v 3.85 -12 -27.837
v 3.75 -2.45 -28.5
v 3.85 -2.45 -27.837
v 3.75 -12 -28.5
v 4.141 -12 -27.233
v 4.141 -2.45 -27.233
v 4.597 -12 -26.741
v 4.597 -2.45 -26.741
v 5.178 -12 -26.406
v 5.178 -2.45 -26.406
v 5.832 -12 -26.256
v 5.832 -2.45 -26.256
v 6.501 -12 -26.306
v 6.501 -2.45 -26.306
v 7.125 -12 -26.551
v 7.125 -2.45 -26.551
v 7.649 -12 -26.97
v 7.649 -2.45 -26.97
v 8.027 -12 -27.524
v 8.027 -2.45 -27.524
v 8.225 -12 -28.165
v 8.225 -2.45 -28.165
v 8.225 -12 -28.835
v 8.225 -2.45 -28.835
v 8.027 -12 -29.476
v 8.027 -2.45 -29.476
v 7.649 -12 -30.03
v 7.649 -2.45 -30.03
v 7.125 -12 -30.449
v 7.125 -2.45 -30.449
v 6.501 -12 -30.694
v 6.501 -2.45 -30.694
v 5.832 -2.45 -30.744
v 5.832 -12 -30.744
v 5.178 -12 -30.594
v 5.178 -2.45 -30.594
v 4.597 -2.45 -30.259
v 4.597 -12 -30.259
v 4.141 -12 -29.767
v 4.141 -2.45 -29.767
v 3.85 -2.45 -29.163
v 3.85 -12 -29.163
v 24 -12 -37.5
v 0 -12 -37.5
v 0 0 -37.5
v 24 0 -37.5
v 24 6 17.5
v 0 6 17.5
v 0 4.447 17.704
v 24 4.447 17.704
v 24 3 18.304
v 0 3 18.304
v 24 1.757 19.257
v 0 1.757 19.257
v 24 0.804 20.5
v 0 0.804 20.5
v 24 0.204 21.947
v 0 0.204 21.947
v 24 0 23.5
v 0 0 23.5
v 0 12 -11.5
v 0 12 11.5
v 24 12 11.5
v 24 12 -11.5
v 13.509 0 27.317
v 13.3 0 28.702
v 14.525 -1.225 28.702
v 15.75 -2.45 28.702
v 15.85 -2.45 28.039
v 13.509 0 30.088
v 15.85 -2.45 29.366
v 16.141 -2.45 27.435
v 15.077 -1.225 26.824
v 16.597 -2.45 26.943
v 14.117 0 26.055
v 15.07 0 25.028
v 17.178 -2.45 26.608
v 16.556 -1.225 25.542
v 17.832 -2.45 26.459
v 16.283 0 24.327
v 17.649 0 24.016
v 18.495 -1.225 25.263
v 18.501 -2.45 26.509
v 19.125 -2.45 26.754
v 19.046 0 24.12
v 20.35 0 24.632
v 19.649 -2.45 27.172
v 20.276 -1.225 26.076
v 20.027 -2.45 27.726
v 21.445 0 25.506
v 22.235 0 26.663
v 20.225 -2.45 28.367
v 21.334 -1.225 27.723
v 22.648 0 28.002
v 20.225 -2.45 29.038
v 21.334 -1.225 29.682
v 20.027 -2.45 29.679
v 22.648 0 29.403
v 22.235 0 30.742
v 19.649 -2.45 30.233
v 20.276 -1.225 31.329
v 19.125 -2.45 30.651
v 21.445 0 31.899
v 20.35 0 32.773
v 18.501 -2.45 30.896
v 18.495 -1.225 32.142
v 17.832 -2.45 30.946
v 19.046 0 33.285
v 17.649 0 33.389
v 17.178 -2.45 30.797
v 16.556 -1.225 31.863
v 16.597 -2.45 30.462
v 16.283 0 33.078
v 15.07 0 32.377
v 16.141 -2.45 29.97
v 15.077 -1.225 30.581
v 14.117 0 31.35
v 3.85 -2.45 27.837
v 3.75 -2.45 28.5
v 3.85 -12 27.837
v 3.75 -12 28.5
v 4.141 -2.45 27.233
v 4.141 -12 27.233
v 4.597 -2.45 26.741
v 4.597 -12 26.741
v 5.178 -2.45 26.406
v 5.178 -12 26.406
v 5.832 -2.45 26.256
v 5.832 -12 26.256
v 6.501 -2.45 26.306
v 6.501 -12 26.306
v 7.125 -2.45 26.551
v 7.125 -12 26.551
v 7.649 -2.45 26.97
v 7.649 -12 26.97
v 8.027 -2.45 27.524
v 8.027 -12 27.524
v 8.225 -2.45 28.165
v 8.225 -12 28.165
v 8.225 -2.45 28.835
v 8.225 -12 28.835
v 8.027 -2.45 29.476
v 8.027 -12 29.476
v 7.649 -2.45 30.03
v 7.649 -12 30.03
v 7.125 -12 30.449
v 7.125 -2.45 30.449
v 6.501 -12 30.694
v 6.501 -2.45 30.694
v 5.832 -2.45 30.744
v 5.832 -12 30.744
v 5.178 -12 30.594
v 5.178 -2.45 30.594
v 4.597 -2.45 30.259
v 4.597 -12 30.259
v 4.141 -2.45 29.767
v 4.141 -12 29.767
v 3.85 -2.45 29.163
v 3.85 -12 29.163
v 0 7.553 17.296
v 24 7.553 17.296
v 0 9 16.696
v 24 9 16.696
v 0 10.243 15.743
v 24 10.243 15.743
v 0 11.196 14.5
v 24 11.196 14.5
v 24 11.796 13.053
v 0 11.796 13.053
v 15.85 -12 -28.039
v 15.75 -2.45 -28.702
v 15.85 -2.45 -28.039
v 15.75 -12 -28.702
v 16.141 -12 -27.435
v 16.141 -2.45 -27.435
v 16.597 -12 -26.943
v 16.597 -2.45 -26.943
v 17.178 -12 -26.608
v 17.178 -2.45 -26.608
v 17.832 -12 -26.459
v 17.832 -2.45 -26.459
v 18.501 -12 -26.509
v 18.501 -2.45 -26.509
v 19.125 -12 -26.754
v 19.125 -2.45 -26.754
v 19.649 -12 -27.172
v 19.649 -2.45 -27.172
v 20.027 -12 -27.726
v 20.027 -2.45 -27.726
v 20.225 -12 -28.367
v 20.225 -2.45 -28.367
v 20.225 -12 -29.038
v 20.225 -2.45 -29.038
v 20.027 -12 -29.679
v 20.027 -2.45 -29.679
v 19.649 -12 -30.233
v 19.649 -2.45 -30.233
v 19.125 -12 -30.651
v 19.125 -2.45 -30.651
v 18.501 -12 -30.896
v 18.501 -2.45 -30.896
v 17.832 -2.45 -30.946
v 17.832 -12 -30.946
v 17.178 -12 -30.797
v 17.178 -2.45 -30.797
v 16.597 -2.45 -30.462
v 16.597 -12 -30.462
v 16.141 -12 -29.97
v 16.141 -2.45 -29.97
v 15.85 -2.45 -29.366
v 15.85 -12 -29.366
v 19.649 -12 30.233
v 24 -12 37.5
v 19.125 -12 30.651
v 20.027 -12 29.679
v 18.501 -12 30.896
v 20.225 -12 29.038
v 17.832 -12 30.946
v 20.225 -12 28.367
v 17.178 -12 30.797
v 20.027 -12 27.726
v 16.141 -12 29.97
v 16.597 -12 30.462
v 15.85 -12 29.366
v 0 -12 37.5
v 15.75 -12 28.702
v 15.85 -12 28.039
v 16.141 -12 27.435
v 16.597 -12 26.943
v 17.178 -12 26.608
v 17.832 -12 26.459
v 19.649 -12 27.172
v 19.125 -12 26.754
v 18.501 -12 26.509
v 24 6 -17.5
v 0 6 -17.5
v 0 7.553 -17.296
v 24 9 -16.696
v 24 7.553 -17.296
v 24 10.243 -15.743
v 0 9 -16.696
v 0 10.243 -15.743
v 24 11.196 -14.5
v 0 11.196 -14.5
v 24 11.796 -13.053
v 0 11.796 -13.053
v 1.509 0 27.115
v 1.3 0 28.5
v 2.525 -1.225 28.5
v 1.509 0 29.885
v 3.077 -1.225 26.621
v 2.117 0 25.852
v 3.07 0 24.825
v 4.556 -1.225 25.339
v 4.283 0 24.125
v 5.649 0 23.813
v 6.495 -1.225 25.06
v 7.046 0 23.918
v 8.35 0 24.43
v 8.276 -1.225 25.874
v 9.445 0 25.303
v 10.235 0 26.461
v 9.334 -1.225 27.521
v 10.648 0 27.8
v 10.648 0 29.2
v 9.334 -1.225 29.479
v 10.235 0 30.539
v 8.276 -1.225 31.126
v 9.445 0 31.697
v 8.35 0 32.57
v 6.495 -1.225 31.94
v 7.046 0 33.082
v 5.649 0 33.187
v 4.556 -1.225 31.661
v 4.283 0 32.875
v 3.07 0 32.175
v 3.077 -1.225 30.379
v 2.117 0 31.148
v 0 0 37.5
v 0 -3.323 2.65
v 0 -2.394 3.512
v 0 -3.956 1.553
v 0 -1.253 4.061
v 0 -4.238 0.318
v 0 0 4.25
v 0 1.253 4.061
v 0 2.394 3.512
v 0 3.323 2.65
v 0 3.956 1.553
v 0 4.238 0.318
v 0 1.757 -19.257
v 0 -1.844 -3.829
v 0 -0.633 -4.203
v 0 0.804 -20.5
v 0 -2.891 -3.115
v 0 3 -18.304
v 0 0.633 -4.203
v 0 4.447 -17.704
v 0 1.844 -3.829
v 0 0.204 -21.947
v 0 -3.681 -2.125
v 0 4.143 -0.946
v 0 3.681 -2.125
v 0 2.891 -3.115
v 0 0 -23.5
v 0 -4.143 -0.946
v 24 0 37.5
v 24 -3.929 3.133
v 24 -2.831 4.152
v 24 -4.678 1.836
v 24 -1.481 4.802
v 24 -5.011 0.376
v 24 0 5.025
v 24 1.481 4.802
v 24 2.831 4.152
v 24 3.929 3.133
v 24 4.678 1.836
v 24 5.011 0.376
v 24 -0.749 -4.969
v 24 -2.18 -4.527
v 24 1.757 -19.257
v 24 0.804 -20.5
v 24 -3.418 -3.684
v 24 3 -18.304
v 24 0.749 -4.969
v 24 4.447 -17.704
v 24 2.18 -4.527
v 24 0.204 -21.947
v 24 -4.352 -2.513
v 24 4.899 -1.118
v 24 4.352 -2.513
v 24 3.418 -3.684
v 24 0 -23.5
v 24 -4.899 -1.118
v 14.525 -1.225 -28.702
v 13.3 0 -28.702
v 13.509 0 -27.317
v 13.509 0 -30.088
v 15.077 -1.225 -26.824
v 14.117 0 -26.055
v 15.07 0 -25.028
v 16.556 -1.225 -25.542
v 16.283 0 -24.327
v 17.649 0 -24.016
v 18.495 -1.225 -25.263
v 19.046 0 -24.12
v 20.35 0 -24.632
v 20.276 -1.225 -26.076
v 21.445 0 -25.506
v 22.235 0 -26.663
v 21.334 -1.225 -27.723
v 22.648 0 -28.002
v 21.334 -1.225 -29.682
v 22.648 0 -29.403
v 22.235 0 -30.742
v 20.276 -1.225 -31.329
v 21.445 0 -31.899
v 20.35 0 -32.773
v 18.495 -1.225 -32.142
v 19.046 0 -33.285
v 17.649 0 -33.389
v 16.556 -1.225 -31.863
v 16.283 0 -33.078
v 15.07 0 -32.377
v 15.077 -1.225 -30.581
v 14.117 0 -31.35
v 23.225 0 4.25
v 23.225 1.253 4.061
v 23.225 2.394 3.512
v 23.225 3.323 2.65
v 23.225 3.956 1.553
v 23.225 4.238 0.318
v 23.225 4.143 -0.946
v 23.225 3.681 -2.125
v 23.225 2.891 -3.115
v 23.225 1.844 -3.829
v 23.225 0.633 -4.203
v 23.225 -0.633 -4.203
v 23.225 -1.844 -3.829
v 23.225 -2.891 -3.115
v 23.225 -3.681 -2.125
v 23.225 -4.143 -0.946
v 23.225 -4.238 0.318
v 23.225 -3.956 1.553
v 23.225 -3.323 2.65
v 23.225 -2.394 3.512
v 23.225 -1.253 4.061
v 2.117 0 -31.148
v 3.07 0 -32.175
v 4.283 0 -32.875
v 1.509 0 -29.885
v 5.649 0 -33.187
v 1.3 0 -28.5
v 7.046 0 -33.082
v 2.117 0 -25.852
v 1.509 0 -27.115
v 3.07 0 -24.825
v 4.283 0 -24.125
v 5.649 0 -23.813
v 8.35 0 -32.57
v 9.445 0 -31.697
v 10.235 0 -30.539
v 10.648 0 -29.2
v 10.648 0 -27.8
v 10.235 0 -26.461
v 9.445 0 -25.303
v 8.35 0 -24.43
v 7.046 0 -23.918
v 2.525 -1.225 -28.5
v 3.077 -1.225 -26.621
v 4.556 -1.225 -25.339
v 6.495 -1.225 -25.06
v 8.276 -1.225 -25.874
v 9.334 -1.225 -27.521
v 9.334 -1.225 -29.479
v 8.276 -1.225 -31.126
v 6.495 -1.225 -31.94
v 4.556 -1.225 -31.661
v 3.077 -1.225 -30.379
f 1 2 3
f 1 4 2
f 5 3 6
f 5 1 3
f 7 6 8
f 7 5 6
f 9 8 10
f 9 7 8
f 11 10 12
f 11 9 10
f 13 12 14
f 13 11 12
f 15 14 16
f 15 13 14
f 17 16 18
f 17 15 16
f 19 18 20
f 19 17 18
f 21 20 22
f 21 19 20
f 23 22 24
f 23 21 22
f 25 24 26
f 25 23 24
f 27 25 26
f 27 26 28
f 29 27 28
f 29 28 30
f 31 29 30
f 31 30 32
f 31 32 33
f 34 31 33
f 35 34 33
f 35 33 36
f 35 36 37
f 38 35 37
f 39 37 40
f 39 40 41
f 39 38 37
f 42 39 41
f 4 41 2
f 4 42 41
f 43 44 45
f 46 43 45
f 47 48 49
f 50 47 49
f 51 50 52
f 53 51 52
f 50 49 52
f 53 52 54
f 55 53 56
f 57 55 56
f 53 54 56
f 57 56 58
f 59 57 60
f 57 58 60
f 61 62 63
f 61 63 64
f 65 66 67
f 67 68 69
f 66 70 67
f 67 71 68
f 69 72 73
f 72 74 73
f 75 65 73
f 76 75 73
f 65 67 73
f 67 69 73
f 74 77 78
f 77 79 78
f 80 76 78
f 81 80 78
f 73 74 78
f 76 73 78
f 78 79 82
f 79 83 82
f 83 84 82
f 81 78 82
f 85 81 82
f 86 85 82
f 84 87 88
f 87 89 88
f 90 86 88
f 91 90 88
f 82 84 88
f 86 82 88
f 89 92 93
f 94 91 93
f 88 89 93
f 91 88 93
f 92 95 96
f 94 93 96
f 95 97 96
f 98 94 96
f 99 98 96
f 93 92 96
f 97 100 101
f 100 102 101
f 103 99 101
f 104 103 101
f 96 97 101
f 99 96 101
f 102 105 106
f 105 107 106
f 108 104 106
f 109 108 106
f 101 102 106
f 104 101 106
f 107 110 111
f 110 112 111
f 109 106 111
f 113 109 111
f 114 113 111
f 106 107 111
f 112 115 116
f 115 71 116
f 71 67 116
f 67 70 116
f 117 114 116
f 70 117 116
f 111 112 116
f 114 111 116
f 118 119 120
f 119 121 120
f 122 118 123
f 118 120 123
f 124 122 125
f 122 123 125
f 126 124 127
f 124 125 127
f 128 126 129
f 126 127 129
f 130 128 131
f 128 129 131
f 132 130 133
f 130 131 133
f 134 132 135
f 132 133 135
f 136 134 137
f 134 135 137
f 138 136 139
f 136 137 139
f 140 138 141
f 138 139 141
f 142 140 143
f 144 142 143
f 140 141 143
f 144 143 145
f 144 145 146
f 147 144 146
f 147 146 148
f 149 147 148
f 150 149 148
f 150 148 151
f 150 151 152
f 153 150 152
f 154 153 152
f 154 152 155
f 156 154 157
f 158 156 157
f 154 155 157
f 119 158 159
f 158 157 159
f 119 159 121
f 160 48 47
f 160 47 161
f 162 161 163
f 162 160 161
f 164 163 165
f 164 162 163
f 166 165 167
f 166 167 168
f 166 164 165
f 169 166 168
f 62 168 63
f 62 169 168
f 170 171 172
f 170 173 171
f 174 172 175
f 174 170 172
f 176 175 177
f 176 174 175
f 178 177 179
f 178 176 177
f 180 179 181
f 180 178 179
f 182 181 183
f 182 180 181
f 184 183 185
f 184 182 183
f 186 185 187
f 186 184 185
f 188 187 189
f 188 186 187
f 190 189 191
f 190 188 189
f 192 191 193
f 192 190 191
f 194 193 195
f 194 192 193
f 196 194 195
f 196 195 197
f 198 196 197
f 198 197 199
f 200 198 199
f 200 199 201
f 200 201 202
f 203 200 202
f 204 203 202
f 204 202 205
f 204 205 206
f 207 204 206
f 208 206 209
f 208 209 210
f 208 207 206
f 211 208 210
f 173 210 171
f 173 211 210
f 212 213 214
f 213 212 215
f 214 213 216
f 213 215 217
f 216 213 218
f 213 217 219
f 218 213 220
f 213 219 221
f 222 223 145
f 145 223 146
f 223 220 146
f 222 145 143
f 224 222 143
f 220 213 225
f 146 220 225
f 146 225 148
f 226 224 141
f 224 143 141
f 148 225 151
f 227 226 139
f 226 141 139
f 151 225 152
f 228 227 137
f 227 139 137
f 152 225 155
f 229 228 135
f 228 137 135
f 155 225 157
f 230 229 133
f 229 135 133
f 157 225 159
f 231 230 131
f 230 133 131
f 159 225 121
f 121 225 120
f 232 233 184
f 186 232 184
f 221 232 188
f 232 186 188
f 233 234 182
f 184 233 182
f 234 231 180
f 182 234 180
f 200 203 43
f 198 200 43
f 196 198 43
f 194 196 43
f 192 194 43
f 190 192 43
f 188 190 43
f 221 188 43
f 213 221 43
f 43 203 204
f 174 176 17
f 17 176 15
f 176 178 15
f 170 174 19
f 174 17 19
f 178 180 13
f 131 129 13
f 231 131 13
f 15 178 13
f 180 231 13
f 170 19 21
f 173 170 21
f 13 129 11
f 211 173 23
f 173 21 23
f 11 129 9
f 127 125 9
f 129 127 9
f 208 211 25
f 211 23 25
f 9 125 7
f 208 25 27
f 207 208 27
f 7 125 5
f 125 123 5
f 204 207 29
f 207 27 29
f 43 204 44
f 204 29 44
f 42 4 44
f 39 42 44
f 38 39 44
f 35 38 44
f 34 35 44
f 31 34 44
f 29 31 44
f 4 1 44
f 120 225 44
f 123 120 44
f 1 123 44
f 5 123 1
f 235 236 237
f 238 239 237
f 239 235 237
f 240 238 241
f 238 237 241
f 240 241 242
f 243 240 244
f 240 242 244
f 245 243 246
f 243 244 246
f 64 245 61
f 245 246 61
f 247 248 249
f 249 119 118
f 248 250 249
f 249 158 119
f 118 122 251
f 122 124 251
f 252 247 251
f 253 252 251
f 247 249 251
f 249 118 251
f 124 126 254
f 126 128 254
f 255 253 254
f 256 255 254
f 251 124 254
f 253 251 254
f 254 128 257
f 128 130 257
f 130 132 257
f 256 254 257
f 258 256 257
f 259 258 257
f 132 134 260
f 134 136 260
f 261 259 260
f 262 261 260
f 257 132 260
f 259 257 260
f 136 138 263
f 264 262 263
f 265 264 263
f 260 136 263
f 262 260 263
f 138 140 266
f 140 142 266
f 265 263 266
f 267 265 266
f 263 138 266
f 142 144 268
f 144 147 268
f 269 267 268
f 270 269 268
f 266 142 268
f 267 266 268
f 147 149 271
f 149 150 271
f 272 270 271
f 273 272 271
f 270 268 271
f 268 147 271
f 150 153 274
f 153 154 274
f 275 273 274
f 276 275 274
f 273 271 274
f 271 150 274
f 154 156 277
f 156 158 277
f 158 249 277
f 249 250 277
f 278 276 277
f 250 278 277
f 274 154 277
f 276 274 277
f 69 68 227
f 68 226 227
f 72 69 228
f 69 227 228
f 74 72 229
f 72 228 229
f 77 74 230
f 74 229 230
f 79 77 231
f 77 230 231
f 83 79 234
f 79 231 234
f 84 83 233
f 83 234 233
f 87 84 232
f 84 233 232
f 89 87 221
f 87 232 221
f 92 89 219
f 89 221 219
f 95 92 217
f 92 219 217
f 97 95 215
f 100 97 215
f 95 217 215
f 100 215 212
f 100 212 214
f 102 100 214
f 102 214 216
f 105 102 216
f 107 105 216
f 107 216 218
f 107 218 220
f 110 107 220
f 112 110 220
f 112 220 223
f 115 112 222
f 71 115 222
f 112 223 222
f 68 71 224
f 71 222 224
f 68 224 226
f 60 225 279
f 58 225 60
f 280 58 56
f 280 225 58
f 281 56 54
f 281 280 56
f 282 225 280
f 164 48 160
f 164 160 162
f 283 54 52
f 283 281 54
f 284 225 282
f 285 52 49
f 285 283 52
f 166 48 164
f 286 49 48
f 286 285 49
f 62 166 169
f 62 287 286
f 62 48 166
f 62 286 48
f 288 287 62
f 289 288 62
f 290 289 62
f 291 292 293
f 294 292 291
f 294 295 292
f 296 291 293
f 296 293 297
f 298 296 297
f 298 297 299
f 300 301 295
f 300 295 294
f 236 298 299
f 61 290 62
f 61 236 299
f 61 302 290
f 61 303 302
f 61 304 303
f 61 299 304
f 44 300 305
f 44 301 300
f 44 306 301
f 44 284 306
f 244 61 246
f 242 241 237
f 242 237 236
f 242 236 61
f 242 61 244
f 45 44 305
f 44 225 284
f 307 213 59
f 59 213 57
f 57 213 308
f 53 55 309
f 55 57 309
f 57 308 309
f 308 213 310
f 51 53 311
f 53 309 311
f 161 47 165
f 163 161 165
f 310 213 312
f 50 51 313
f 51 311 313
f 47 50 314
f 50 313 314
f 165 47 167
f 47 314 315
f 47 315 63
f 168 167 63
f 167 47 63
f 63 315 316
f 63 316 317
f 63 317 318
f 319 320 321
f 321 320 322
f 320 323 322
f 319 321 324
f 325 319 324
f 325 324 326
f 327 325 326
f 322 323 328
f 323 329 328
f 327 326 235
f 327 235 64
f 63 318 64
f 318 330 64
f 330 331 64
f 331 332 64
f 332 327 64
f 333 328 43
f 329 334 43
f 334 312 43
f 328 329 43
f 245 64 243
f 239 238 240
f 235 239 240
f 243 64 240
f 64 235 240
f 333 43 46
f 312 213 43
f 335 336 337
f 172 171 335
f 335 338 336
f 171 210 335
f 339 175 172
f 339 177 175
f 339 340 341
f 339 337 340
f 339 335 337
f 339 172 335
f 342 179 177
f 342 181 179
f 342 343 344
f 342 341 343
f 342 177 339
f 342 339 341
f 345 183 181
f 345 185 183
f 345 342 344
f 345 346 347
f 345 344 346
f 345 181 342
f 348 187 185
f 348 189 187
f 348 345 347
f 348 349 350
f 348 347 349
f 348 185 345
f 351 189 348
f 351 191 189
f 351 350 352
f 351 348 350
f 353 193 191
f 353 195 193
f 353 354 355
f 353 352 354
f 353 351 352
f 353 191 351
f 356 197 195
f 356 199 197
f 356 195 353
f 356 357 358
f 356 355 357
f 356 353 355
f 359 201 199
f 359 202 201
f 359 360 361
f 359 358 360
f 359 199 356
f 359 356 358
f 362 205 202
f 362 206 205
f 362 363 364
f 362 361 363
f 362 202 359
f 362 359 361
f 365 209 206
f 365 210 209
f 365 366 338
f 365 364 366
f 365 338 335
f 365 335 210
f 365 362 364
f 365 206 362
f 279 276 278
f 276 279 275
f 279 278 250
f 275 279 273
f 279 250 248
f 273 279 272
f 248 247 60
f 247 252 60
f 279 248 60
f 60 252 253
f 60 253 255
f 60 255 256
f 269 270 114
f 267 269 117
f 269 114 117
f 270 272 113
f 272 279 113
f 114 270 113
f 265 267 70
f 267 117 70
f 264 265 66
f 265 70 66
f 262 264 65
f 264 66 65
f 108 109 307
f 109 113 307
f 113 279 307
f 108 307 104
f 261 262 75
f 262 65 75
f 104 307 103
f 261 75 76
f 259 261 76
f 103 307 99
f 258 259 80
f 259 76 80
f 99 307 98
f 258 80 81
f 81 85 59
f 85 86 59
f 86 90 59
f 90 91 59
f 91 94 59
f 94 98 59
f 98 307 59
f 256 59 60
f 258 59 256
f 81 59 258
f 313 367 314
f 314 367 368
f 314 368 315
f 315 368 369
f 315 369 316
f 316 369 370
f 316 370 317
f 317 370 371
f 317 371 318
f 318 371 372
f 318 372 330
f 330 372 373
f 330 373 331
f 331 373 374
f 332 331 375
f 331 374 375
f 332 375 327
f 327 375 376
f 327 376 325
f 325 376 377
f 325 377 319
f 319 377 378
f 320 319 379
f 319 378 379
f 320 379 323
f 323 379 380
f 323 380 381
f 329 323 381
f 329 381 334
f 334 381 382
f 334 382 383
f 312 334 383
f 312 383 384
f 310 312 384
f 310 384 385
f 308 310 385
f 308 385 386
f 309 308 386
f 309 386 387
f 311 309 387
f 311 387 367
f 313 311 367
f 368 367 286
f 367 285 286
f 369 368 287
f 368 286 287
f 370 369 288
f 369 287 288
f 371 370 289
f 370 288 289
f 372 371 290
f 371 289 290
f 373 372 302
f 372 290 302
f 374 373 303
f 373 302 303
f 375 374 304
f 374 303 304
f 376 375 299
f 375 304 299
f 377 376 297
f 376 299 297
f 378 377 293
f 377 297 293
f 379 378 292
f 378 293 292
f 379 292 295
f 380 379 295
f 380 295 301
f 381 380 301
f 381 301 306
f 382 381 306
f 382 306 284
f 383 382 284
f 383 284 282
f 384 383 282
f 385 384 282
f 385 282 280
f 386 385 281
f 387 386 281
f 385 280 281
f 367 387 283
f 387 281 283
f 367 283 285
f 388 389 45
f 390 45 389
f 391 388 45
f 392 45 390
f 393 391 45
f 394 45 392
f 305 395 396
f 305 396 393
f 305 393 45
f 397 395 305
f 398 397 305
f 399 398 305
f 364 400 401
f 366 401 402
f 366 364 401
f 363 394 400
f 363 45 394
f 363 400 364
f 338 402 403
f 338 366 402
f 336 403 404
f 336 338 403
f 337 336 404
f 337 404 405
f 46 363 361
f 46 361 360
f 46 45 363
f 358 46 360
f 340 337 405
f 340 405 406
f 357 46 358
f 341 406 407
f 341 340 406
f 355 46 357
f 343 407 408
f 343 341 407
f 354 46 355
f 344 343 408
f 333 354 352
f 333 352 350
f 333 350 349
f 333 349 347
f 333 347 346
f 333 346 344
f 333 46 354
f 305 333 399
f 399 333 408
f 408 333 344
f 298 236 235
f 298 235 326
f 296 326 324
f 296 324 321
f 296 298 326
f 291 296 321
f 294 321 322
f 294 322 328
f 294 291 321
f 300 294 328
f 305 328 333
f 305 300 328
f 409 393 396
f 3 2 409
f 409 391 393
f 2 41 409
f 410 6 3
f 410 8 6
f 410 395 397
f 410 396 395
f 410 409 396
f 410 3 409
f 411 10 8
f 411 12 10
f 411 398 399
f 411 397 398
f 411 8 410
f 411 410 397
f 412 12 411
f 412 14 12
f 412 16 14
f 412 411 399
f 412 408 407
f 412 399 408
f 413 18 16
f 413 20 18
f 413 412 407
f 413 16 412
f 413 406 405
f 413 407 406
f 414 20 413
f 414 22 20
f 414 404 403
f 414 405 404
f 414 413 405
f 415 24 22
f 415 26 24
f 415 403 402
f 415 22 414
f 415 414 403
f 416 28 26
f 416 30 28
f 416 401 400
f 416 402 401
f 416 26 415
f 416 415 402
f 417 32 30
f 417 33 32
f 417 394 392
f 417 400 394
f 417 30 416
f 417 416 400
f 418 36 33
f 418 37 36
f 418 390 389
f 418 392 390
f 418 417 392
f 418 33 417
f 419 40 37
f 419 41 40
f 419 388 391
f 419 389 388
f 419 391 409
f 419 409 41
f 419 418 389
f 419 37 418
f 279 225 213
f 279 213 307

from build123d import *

# Parameters (mm, degrees)
SKETCH1_W                                       = 75
SKETCH1_H                                       = 24
BOSS_EXTRUDE1_DEPTH                             = 24
SKETCH2_W                                       = 20
SKETCH2_H                                       = 12
CUT_EXTRUDE1_DEPTH                              = 24
FILLET1_START                                   = -1
FILLET1_DEPTH                                   = 26
FILLET1_2_DEPTH                                 = 24
CSK_FOR_M4_FLAT_HEAD_MACHINE_SCREW1_D           = 4.5
CSK_FOR_M4_FLAT_HEAD_MACHINE_SCREW1_CSINK_D     = 9.4
CSK_FOR_M4_FLAT_HEAD_MACHINE_SCREW1_CSINK_ANGLE = 90
M10X1_5_TAPPED_HOLE1_D                          = 8.5
M10X1_5_TAPPED_HOLE1_CSINK_D                    = 10.05
M10X1_5_TAPPED_HOLE1_CSINK_ANGLE                = 90


with BuildPart() as part:
    # Sketch1 → Boss-Extrude1 (new body)
    with BuildSketch(Plane(origin=(0, 0, 0), x_dir=(0, 0, -1), z_dir=(1, 0, 0))):
        Rectangle(SKETCH1_W, SKETCH1_H)
    extrude(amount=BOSS_EXTRUDE1_DEPTH)

    # Sketch2 → Cut-Extrude1 (cut)
    with BuildSketch(Plane(origin=(24, 0, 0), x_dir=(0, 0, -1), z_dir=(1, 0, 0))):
        with Locations((-27.5, 6)):
            Rectangle(SKETCH2_W, SKETCH2_H)
    cut_extrude1 = extrude(amount=-CUT_EXTRUDE1_DEPTH, mode=Mode.SUBTRACT)

    # Fillet1: read off the stored shape, not the designer's step
    # Fillet1 outline → Fillet1 (cut)
    with BuildSketch(Plane.YZ.offset(FILLET1_START)):
        with BuildLine():
            Line((12, 17.5), (6, 17.5))
            ThreePointArc((6, 17.5), (10.242640687, 15.742640687), (12, 11.5))
            Line((12, 11.5), (12, 17.5))
        make_face()
    fillet1 = extrude(amount=FILLET1_DEPTH, mode=Mode.SUBTRACT)

    # Fillet1 2 outline → Fillet1 2 (add)
    with BuildSketch(Plane.YZ):
        with BuildLine():
            Line((0, 17.5), (6, 17.5))
            ThreePointArc((6, 17.5), (1.757359313, 19.257359313), (0, 23.5))
            Line((0, 23.5), (0, 17.5))
        make_face()
    fillet1_2 = extrude(amount=FILLET1_2_DEPTH)

    # CSK for M4 Flat Head Machine Screw1 (through all)
    with Locations(Plane(origin=(0, 0, 0), x_dir=(1, 0, 0), z_dir=(0, 1, 0))):
        with Locations((6, -28.5), (18, -28.702489343)):
            csk_for_m4_flat_head_machine_screw1 = CounterSinkHole(CSK_FOR_M4_FLAT_HEAD_MACHINE_SCREW1_D / 2, CSK_FOR_M4_FLAT_HEAD_MACHINE_SCREW1_CSINK_D / 2, counter_sink_angle=CSK_FOR_M4_FLAT_HEAD_MACHINE_SCREW1_CSINK_ANGLE)

    # Mirror1: Cut-Extrude1, Fillet1, Fillet1 2, CSK for M4 Flat Head Machine Screw1 across plane
    add(cut_extrude1.mirror(Plane.XY), mode=Mode.SUBTRACT)
    add(fillet1.mirror(Plane.XY), mode=Mode.SUBTRACT)
    add(fillet1_2.mirror(Plane.XY))
    add(csk_for_m4_flat_head_machine_screw1.mirror(Plane.XY), mode=Mode.SUBTRACT)

    # M10x1.5 Tapped Hole1 (through all)
    with Locations(Plane(origin=(24, 0, 0), x_dir=(0, 0, -1), z_dir=(1, 0, 0))):
        with Locations((0, 0)):
            CounterSinkHole(M10X1_5_TAPPED_HOLE1_D / 2, M10X1_5_TAPPED_HOLE1_CSINK_D / 2, counter_sink_angle=M10X1_5_TAPPED_HOLE1_CSINK_ANGLE)


solid = part.part
